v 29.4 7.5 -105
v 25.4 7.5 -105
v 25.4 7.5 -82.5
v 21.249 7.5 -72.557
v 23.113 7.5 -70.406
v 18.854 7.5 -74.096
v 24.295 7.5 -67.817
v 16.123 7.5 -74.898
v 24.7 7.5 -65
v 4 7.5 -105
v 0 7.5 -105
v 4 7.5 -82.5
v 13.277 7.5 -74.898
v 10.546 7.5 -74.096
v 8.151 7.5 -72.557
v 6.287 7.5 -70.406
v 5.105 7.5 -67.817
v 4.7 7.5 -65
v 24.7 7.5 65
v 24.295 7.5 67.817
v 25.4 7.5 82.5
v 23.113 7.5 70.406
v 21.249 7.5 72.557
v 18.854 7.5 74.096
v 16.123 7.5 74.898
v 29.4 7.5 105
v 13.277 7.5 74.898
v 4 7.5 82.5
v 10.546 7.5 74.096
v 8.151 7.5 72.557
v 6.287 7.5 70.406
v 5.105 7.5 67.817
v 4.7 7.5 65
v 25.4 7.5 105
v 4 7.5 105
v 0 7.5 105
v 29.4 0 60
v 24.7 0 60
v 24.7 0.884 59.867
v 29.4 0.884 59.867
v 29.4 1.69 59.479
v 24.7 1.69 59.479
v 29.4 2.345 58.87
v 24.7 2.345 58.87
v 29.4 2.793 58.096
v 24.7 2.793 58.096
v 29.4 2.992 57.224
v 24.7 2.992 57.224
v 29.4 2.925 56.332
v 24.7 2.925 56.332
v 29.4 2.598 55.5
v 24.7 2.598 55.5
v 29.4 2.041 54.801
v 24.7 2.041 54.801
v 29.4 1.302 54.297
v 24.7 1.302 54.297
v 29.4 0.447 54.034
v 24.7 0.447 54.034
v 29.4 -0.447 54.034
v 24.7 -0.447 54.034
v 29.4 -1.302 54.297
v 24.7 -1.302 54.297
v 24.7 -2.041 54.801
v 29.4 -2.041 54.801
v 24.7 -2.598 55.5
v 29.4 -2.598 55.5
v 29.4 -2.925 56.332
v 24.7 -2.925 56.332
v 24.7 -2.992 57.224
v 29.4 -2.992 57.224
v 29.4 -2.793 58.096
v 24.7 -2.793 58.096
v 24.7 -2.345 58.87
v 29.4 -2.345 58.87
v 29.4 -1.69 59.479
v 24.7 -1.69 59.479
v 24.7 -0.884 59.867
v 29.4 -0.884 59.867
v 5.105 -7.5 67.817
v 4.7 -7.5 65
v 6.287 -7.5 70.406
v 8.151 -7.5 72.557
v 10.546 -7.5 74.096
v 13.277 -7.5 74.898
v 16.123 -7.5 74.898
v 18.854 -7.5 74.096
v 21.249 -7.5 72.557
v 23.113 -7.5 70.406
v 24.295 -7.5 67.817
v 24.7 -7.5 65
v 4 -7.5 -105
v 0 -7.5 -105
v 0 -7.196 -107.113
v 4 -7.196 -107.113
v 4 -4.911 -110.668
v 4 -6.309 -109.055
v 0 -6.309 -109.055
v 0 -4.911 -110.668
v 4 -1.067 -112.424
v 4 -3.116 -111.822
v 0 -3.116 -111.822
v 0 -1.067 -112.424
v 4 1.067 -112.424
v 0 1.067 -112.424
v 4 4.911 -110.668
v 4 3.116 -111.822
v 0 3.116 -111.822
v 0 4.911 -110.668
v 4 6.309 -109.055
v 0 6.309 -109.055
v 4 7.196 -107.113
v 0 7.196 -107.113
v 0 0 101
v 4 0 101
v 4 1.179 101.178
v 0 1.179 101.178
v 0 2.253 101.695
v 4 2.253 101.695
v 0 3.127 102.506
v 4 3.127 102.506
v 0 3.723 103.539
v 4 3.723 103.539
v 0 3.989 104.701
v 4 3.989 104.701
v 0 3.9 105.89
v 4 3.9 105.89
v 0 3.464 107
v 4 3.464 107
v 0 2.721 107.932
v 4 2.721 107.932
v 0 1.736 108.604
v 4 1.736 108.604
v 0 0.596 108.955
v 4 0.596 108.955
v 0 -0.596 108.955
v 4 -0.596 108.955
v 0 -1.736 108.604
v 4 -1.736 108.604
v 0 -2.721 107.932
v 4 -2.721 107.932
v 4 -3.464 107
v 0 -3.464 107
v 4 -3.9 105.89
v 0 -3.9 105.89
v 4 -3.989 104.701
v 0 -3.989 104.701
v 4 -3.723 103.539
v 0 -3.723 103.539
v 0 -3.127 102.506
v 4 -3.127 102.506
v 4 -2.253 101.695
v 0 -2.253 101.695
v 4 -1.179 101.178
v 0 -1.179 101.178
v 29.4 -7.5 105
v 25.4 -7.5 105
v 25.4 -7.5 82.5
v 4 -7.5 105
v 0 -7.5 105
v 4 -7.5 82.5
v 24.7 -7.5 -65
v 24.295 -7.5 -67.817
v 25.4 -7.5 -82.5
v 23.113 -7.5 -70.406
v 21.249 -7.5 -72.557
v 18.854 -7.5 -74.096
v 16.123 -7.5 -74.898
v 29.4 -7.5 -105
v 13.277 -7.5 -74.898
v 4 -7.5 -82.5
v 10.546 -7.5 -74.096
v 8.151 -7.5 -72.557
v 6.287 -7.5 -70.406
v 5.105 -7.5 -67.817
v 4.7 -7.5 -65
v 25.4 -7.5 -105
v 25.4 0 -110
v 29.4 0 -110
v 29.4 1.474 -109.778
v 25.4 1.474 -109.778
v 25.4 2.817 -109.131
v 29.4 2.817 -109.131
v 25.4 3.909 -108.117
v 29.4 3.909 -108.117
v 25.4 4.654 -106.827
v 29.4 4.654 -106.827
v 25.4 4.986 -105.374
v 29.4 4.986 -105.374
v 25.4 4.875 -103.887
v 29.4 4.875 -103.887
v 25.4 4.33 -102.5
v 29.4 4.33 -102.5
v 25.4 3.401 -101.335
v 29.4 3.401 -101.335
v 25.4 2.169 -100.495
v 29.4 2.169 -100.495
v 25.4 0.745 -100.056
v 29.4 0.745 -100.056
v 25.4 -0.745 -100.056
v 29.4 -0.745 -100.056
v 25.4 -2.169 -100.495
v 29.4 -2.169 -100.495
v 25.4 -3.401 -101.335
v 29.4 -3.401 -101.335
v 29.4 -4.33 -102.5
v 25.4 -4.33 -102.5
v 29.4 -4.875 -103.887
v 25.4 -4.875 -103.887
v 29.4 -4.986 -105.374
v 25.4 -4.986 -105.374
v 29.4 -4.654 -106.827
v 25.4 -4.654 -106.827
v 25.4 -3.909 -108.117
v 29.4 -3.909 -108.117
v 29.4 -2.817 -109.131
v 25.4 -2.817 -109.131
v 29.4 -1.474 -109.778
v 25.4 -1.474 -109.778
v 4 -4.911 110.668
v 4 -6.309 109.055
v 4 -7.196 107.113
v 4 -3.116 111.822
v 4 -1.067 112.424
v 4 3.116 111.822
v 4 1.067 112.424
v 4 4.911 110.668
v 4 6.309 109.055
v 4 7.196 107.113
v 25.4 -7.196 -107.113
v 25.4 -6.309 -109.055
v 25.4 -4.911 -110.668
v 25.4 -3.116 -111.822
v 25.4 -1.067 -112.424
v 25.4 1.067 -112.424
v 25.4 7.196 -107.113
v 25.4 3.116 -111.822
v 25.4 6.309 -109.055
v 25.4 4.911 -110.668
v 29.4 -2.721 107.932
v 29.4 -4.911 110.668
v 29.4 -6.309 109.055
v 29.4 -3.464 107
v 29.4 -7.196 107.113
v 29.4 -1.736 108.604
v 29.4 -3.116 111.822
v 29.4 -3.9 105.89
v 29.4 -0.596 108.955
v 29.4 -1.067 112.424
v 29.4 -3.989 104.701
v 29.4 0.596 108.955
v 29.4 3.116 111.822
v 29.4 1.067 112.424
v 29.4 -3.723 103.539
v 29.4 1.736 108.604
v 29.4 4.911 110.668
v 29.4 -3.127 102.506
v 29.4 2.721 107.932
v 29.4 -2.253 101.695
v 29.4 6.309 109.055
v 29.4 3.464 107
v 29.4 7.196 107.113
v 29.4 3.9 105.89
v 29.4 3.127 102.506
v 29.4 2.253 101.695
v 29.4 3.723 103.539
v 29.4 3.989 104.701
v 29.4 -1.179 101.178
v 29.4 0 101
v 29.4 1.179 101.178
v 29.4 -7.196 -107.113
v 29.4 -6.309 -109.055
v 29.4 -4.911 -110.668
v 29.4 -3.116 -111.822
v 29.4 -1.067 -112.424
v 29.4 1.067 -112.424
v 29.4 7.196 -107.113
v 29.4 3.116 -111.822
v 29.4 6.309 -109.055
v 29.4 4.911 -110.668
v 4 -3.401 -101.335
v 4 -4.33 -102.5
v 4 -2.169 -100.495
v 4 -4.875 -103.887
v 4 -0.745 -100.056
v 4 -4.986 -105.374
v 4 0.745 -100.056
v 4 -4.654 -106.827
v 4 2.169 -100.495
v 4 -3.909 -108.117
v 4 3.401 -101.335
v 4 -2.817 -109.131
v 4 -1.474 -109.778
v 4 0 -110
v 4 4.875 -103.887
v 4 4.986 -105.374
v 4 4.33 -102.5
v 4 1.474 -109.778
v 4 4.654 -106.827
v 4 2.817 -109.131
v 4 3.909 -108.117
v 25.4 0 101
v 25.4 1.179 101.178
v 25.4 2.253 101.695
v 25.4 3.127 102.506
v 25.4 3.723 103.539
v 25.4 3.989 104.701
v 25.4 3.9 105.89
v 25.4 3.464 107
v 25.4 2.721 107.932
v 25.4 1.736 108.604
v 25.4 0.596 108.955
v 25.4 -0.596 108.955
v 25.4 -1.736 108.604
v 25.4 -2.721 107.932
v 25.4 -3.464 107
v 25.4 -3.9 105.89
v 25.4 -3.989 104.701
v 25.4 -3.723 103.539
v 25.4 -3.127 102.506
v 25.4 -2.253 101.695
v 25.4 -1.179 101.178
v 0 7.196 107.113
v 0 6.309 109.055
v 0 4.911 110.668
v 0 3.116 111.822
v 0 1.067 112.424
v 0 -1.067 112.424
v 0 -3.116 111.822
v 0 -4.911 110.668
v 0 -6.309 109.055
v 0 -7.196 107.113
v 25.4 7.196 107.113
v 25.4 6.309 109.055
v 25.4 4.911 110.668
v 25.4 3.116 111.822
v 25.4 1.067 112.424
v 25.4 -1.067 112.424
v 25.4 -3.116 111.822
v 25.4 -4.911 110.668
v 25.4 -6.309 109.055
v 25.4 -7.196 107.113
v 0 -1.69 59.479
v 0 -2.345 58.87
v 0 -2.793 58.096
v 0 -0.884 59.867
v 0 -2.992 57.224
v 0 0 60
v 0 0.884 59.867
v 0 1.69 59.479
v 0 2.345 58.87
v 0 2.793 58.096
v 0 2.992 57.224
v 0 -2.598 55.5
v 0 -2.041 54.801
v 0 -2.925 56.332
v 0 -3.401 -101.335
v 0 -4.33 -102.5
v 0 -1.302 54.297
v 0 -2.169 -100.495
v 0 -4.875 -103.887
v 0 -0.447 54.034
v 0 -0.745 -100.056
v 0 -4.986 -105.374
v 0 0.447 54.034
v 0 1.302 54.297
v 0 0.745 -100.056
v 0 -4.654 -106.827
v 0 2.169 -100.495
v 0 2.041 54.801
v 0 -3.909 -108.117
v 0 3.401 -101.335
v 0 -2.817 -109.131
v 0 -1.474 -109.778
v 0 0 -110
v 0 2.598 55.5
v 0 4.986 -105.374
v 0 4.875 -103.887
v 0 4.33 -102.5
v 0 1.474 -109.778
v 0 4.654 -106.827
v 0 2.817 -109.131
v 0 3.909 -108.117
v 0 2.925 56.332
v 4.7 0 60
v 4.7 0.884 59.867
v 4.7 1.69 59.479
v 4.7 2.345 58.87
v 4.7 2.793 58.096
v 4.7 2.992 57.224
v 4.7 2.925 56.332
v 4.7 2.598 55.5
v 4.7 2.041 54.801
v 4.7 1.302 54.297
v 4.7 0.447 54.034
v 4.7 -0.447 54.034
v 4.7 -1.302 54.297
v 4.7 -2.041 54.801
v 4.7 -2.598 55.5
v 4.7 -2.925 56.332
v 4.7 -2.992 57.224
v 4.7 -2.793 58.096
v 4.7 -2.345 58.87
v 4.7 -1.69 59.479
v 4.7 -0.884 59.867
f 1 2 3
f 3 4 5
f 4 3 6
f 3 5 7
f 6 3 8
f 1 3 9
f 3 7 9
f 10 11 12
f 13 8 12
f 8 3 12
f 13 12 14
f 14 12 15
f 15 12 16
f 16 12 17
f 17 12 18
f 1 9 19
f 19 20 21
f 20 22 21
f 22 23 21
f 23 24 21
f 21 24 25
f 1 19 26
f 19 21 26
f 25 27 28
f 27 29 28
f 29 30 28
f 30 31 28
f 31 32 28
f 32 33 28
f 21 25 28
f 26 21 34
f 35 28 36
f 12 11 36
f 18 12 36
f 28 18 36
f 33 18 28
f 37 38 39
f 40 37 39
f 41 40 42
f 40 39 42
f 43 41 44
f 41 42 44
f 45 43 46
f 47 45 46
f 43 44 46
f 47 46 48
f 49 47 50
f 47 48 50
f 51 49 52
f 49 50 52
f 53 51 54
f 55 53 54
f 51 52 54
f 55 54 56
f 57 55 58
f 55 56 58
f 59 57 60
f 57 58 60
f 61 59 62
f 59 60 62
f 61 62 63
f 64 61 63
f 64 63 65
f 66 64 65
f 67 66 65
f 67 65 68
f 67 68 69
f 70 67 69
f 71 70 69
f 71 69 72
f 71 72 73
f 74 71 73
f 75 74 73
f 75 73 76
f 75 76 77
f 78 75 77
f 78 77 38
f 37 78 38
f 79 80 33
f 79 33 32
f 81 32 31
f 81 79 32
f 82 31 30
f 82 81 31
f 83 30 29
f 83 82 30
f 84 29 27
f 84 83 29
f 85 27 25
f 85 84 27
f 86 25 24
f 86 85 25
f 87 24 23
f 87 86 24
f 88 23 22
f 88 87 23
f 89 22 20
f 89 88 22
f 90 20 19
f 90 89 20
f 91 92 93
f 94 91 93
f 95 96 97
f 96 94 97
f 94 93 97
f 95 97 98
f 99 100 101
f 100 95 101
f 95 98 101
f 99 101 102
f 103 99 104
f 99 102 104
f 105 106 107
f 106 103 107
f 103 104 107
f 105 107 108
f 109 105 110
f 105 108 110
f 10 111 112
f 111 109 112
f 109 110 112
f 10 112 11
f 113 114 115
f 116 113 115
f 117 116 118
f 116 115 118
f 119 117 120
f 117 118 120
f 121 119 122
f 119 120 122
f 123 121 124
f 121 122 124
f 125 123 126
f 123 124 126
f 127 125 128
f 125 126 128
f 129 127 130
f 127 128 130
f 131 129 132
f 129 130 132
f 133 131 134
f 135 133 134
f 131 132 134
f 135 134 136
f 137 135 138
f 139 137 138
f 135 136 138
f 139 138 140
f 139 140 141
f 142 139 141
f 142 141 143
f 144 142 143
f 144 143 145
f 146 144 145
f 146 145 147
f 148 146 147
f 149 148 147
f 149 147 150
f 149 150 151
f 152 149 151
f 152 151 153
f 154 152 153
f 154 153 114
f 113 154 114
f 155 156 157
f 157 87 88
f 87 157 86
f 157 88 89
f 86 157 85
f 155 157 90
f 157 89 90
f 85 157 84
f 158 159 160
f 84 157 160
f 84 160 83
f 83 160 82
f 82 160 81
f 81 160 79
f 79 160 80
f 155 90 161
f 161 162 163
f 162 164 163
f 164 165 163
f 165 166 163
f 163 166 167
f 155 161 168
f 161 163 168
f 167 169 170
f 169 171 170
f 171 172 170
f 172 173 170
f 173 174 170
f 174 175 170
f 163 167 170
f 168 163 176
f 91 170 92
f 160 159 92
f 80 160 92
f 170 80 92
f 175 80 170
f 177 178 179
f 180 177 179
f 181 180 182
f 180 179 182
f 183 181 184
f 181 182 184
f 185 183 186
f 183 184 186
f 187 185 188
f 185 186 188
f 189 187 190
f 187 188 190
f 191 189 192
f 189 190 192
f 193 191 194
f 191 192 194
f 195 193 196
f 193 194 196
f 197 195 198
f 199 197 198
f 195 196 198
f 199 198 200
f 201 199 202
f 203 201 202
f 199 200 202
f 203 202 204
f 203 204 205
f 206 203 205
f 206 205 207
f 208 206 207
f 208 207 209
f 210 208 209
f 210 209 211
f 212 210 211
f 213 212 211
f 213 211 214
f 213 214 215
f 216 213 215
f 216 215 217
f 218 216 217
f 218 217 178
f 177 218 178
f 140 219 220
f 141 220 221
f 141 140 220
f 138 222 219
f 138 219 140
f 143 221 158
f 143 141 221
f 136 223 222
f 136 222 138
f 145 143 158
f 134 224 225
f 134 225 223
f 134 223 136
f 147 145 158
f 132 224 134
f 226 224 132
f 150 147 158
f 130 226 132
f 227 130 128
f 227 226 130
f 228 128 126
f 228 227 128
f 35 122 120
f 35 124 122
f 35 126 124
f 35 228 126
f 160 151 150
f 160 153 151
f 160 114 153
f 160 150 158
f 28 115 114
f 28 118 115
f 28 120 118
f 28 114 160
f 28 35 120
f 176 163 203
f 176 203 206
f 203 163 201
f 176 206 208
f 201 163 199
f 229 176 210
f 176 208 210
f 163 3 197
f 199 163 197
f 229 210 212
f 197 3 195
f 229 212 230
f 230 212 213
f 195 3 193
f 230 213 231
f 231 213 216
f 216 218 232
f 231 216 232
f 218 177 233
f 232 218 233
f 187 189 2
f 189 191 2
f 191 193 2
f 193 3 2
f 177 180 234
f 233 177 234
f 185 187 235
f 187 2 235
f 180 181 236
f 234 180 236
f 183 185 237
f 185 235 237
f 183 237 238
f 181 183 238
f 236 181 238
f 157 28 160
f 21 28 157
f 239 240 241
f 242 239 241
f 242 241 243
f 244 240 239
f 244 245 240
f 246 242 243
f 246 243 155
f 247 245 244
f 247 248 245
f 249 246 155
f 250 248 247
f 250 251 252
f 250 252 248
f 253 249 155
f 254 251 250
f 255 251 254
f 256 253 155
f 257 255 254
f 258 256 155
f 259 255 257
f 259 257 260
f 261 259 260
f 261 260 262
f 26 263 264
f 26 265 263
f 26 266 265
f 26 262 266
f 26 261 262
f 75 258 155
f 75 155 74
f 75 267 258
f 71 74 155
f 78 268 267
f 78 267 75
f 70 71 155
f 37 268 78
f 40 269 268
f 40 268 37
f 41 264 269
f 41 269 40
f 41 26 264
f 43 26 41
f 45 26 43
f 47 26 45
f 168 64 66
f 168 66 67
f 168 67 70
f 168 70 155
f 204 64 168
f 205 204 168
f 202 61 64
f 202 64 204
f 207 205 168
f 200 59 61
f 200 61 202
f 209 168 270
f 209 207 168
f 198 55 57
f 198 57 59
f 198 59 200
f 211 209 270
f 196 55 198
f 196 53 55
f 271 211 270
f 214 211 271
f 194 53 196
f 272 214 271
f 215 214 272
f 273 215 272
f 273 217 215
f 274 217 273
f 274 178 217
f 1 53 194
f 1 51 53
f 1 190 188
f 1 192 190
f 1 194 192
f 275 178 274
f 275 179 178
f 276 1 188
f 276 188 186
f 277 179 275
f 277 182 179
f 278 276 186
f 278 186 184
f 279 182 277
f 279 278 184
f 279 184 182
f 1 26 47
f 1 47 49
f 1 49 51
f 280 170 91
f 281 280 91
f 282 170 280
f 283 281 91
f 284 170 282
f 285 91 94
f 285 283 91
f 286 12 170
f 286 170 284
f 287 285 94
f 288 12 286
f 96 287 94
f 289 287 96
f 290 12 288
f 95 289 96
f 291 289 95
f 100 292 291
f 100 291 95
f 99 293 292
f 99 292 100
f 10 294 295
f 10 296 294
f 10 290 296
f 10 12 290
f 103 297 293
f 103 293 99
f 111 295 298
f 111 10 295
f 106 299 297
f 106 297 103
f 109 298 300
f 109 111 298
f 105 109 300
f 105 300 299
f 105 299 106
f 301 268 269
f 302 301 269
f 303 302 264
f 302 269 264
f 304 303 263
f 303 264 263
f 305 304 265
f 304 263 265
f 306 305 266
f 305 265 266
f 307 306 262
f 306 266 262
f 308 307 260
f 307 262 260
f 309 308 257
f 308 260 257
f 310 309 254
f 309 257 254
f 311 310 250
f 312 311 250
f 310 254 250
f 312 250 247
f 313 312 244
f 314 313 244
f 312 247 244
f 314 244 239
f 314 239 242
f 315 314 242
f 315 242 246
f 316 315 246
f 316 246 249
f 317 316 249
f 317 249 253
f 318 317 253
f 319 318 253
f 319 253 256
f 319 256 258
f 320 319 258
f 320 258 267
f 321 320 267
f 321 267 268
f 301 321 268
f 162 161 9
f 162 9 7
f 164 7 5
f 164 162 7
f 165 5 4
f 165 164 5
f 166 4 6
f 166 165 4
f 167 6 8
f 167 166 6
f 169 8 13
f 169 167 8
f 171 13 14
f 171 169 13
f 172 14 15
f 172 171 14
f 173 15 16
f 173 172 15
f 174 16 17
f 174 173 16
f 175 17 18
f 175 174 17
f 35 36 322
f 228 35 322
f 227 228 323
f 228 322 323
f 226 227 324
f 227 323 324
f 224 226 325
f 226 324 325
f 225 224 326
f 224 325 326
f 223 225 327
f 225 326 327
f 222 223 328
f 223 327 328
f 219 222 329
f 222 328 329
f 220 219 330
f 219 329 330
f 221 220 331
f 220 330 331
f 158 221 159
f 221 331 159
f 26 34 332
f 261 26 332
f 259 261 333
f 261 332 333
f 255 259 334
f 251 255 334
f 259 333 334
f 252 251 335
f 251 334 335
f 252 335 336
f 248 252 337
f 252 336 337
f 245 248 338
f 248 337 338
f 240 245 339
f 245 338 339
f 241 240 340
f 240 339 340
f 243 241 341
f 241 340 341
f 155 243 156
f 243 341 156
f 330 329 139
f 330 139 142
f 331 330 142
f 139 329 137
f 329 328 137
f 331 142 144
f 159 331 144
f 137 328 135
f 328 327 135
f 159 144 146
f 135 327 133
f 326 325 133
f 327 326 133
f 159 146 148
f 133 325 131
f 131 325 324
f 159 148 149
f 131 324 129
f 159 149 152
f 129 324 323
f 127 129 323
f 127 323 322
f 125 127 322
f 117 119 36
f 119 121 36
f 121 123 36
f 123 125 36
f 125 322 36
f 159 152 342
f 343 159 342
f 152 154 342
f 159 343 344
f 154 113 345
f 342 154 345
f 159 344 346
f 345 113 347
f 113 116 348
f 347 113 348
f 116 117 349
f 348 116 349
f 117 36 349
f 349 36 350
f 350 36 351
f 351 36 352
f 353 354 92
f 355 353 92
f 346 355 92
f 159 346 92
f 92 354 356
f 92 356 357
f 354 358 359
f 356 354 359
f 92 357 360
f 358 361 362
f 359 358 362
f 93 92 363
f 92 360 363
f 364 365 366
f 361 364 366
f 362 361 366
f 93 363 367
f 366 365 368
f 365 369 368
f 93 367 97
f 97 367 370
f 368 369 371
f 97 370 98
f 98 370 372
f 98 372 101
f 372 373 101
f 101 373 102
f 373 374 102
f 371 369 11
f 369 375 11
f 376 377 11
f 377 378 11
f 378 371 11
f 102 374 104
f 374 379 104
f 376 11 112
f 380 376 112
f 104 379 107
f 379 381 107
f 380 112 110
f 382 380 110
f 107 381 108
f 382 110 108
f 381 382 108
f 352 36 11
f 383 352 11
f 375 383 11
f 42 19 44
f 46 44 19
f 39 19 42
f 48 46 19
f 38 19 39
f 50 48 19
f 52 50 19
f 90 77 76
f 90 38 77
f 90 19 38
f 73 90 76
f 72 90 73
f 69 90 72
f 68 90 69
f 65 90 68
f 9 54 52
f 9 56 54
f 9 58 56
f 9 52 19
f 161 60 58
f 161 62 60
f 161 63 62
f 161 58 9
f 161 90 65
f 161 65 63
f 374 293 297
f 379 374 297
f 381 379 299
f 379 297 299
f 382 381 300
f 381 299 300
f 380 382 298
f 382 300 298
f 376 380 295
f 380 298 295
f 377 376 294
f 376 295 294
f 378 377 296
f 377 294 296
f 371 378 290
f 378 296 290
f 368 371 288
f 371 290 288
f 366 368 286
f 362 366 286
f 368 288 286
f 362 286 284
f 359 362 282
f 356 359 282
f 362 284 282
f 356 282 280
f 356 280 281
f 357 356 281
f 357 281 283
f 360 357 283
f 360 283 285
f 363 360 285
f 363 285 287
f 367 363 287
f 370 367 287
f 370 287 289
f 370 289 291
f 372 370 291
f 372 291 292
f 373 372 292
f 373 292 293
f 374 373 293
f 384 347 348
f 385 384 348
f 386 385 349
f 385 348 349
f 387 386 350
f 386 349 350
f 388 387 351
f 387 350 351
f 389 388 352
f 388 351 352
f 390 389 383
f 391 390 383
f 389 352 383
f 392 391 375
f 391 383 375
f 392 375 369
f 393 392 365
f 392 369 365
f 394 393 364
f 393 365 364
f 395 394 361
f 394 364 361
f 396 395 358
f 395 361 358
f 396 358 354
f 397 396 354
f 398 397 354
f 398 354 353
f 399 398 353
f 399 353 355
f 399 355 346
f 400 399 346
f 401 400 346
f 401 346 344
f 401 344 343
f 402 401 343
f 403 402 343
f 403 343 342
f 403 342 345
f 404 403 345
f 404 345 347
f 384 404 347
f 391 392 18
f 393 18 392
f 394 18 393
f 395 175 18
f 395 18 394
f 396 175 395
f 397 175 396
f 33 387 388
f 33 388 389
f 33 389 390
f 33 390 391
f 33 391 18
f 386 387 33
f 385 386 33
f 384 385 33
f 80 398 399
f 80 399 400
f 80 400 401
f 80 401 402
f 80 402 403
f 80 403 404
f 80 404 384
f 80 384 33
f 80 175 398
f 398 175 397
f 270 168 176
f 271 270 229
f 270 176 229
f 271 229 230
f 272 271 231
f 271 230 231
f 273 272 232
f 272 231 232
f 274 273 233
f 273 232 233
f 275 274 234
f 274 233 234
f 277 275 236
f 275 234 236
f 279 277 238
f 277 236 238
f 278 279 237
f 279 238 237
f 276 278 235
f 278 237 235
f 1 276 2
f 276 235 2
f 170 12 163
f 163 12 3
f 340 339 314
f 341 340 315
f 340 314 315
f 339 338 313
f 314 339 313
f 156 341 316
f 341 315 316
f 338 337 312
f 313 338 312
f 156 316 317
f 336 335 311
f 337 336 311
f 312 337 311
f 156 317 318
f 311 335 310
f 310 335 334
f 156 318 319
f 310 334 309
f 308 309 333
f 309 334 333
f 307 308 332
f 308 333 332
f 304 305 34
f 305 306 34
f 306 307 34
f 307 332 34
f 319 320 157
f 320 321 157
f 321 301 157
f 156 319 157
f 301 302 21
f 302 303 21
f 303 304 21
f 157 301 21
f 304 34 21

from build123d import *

# Parameters (mm, degrees)
EXTRUDE_1_DEPTH     = 29.4
SKETCH_3_W          = 21.4
SKETCH_3_H          = 30
CUT_EXTRUDE_1_DEPTH = 118.241673478
SKETCH_4_R          = 4
SKETCH_4_R_2        = 5
CUT_EXTRUDE_2_DEPTH = 117.519783728
CUT_EXTRUDE_3_DEPTH = 118.241673478
SKETCH_6_R          = 3
CUT_EXTRUDE_4_DEPTH = 117.519783728


with BuildPart() as part:
    # 草图2 → 凸台-拉伸1 (new body)
    with BuildSketch(Plane(origin=(0, 0, 0), x_dir=(0, 0, -1), z_dir=(1, 0, 0))):
        with BuildLine():
            Line((-105, -7.5), (105, -7.5))
            ThreePointArc((105, -7.5), (112.5, 0), (105, 7.5))
            Line((105, 7.5), (-105, 7.5))
            ThreePointArc((-105, 7.5), (-112.5, 0), (-105, -7.5))
        make_face()
    extrude(amount=EXTRUDE_1_DEPTH)

    # 草图3 → 切除-拉伸1 (cut, through all)
    with BuildSketch(Plane(origin=(0, 7.5, 0), x_dir=(1, 0, 0), z_dir=(0, 1, 0))):
        with Locations((14.7, -97.5)):
            Rectangle(SKETCH_3_W, SKETCH_3_H)
        with Locations((14.7, 97.5)):
            Rectangle(SKETCH_3_W, SKETCH_3_H)
    extrude(amount=-CUT_EXTRUDE_1_DEPTH, mode=Mode.SUBTRACT)

    # 草图4 → 切除-拉伸2 (cut, through all)
    with BuildSketch(Plane(origin=(29.4, 0, 0), x_dir=(0, 0, -1), z_dir=(1, 0, 0))):
        with Locations((-105, 0)):
            Circle(SKETCH_4_R)
        with Locations((105, 0)):
            Circle(SKETCH_4_R_2)
    extrude(amount=-CUT_EXTRUDE_2_DEPTH, mode=Mode.SUBTRACT)

    # 草图5 → 切除-拉伸3 (cut, through all)
    with BuildSketch(Plane.XZ.offset(7.5)):
        with BuildLine():
            Line((24.7, 65), (24.7, -65))
            ThreePointArc((24.7, -65), (14.7, -75), (4.7, -65))
            Line((4.7, -65), (4.7, 65))
            ThreePointArc((4.7, 65), (14.7, 75), (24.7, 65))
        make_face()
    extrude(amount=-CUT_EXTRUDE_3_DEPTH, mode=Mode.SUBTRACT)

    # 草图6 → 切除-拉伸4 (cut, through all)
    with BuildSketch(Plane.ZY):
        with Locations((57, 0)):
            Circle(SKETCH_6_R)
    extrude(amount=-CUT_EXTRUDE_4_DEPTH, mode=Mode.SUBTRACT)


solid = part.part
